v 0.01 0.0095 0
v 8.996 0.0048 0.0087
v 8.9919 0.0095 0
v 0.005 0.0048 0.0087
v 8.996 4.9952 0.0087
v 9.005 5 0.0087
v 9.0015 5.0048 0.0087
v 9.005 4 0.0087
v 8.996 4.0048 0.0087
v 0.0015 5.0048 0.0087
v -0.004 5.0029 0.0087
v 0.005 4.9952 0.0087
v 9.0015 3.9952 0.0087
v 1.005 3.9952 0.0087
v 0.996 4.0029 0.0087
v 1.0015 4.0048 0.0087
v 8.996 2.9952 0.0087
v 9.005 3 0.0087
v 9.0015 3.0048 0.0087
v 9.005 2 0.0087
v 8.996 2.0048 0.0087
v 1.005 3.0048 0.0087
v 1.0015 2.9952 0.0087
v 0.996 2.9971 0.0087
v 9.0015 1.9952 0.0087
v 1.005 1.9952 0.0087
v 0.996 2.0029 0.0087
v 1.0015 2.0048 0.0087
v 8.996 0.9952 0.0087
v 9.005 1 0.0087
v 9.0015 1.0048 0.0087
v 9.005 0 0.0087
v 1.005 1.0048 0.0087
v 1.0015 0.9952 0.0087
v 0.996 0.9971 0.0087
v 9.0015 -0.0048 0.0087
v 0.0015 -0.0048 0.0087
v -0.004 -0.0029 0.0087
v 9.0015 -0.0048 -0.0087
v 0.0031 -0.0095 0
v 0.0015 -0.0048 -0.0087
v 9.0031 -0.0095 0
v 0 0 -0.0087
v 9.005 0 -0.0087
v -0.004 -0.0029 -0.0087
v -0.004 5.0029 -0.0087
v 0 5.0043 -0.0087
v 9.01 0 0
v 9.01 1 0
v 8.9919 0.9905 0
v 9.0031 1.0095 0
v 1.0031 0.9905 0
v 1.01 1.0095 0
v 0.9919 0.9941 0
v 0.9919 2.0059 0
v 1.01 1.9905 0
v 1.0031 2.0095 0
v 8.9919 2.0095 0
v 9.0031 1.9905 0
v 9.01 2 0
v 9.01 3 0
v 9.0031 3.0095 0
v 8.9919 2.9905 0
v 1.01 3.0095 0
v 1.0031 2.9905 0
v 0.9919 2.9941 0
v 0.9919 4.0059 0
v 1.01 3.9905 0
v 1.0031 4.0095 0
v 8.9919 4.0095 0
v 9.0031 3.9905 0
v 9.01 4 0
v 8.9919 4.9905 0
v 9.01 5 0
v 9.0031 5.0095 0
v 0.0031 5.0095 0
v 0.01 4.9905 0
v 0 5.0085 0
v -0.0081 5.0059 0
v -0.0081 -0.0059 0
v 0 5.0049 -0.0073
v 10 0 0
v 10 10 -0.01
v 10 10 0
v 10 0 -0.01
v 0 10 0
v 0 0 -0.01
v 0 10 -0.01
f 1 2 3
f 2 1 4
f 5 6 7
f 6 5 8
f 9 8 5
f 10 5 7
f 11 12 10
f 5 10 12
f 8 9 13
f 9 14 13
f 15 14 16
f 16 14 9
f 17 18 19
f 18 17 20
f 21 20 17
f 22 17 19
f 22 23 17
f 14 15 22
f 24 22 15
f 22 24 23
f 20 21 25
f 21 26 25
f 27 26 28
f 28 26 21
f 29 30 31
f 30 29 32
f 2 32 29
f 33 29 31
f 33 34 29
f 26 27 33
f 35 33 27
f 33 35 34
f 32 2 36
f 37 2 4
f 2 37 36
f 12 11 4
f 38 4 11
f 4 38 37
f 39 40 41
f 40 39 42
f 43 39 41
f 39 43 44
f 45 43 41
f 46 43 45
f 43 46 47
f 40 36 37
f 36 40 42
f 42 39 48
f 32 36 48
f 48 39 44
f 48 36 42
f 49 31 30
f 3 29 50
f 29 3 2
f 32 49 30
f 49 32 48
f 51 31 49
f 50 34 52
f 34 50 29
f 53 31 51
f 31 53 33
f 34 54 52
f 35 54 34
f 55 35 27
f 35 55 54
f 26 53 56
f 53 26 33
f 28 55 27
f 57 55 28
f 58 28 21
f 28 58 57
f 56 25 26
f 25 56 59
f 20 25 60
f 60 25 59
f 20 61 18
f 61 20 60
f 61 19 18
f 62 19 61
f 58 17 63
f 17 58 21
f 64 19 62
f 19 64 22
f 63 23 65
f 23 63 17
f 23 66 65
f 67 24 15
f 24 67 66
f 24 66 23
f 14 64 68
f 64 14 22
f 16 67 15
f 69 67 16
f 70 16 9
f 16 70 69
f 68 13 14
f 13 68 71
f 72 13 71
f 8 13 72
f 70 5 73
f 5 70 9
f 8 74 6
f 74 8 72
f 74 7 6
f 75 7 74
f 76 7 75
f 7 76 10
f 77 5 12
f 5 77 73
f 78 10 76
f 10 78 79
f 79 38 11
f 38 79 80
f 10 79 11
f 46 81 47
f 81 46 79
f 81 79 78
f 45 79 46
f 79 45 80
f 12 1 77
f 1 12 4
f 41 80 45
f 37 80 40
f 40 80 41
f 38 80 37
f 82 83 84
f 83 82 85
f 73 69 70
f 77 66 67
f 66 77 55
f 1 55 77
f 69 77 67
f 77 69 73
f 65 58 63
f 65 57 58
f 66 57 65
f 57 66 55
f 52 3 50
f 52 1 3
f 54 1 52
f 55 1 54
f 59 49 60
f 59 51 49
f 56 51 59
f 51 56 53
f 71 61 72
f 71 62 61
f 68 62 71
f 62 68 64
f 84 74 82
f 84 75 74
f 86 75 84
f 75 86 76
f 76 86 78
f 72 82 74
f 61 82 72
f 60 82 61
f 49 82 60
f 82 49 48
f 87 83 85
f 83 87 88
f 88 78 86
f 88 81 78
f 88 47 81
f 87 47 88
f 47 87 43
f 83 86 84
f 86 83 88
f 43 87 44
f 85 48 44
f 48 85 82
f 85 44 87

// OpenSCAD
hull(){
    translate([1.0, 0.0]) sphere(0.01);
    translate([2.0, 0.0]) sphere(0.01);
}
hull(){
    translate([2.0, 0.0]) sphere(0.01);
    translate([3.0, 0.0]) sphere(0.01);
}
hull(){
    translate([3.0, 0.0]) sphere(0.01);
    translate([4.0, 0.0]) sphere(0.01);
}
hull(){
    translate([4.0, 0.0]) sphere(0.01);
    translate([5.0, 0.0]) sphere(0.01);
}
hull(){
    translate([5.0, 0.0]) sphere(0.01);
    translate([6.0, 0.0]) sphere(0.01);
}
hull(){
    translate([6.0, 0.0]) sphere(0.01);
    translate([7.0, 0.0]) sphere(0.01);
}
hull(){
    translate([7.0, 0.0]) sphere(0.01);
    translate([8.0, 0.0]) sphere(0.01);
}
hull(){
    translate([8.0, 0.0]) sphere(0.01);
    translate([9.0, 0.0]) sphere(0.01);
}
hull(){
    translate([9.0, 0.0]) sphere(0.01);
    translate([9.0, 1.0]) sphere(0.01);
}
hull(){
    translate([9.0, 1.0]) sphere(0.01);
    translate([8.0, 1.0]) sphere(0.01);
}
hull(){
    translate([8.0, 1.0]) sphere(0.01);
    translate([7.0, 1.0]) sphere(0.01);
}
hull(){
    translate([7.0, 1.0]) sphere(0.01);
    translate([6.0, 1.0]) sphere(0.01);
}
hull(){
    translate([6.0, 1.0]) sphere(0.01);
    translate([5.0, 1.0]) sphere(0.01);
}
hull(){
    translate([5.0, 1.0]) sphere(0.01);
    translate([4.0, 1.0]) sphere(0.01);
}
hull(){
    translate([4.0, 1.0]) sphere(0.01);
    translate([3.0, 1.0]) sphere(0.01);
}
hull(){
    translate([3.0, 1.0]) sphere(0.01);
    translate([2.0, 1.0]) sphere(0.01);
}
hull(){
    translate([2.0, 1.0]) sphere(0.01);
    translate([1.0, 1.0]) sphere(0.01);
}
hull(){
    translate([1.0, 1.0]) sphere(0.01);
    translate([1.0, 2.0]) sphere(0.01);
}
hull(){
    translate([1.0, 2.0]) sphere(0.01);
    translate([2.0, 2.0]) sphere(0.01);
}
hull(){
    translate([2.0, 2.0]) sphere(0.01);
    translate([3.0, 2.0]) sphere(0.01);
}
hull(){
    translate([3.0, 2.0]) sphere(0.01);
    translate([4.0, 2.0]) sphere(0.01);
}
hull(){
    translate([4.0, 2.0]) sphere(0.01);
    translate([5.0, 2.0]) sphere(0.01);
}
hull(){
    translate([5.0, 2.0]) sphere(0.01);
    translate([6.0, 2.0]) sphere(0.01);
}
hull(){
    translate([6.0, 2.0]) sphere(0.01);
    translate([7.0, 2.0]) sphere(0.01);
}
hull(){
    translate([7.0, 2.0]) sphere(0.01);
    translate([8.0, 2.0]) sphere(0.01);
}
hull(){
    translate([8.0, 2.0]) sphere(0.01);
    translate([9.0, 2.0]) sphere(0.01);
}
hull(){
    translate([9.0, 2.0]) sphere(0.01);
    translate([9.0, 3.0]) sphere(0.01);
}
hull(){
    translate([9.0, 3.0]) sphere(0.01);
    translate([8.0, 3.0]) sphere(0.01);
}
hull(){
    translate([8.0, 3.0]) sphere(0.01);
    translate([7.0, 3.0]) sphere(0.01);
}
hull(){
    translate([7.0, 3.0]) sphere(0.01);
    translate([6.0, 3.0]) sphere(0.01);
}
hull(){
    translate([6.0, 3.0]) sphere(0.01);
    translate([5.0, 3.0]) sphere(0.01);
}
hull(){
    translate([5.0, 3.0]) sphere(0.01);
    translate([4.0, 3.0]) sphere(0.01);
}
hull(){
    translate([4.0, 3.0]) sphere(0.01);
    translate([3.0, 3.0]) sphere(0.01);
}
hull(){
    translate([3.0, 3.0]) sphere(0.01);
    translate([2.0, 3.0]) sphere(0.01);
}
hull(){
    translate([2.0, 3.0]) sphere(0.01);
    translate([1.0, 3.0]) sphere(0.01);
}
hull(){
    translate([1.0, 3.0]) sphere(0.01);
    translate([1.0, 4.0]) sphere(0.01);
}
hull(){
    translate([1.0, 4.0]) sphere(0.01);
    translate([2.0, 4.0]) sphere(0.01);
}
hull(){
    translate([2.0, 4.0]) sphere(0.01);
    translate([3.0, 4.0]) sphere(0.01);
}
hull(){
    translate([3.0, 4.0]) sphere(0.01);
    translate([4.0, 4.0]) sphere(0.01);
}
hull(){
    translate([4.0, 4.0]) sphere(0.01);
    translate([5.0, 4.0]) sphere(0.01);
}
hull(){
    translate([5.0, 4.0]) sphere(0.01);
    translate([6.0, 4.0]) sphere(0.01);
}
hull(){
    translate([6.0, 4.0]) sphere(0.01);
    translate([7.0, 4.0]) sphere(0.01);
}
hull(){
    translate([7.0, 4.0]) sphere(0.01);
    translate([8.0, 4.0]) sphere(0.01);
}
hull(){
    translate([8.0, 4.0]) sphere(0.01);
    translate([9.0, 4.0]) sphere(0.01);
}
hull(){
    translate([9.0, 4.0]) sphere(0.01);
    translate([9.0, 5.0]) sphere(0.01);
}
hull(){
    translate([9.0, 5.0]) sphere(0.01);
    translate([8.0, 5.0]) sphere(0.01);
}
hull(){
    translate([8.0, 5.0]) sphere(0.01);
    translate([7.0, 5.0]) sphere(0.01);
}
hull(){
    translate([7.0, 5.0]) sphere(0.01);
    translate([6.0, 5.0]) sphere(0.01);
}
hull(){
    translate([6.0, 5.0]) sphere(0.01);
    translate([5.0, 5.0]) sphere(0.01);
}
hull(){
    translate([5.0, 5.0]) sphere(0.01);
    translate([4.0, 5.0]) sphere(0.01);
}
hull(){
    translate([4.0, 5.0]) sphere(0.01);
    translate([3.0, 5.0]) sphere(0.01);
}
hull(){
    translate([3.0, 5.0]) sphere(0.01);
    translate([2.0, 5.0]) sphere(0.01);
}
hull(){
    translate([2.0, 5.0]) sphere(0.01);
    translate([1.0, 5.0]) sphere(0.01);
}
hull(){
    translate([1.0, 5.0]) sphere(0.01);
    translate([0.0, 5.0]) sphere(0.01);
}
hull(){
    translate([0.0, 5.0]) sphere(0.01);
    translate([0.0, 4.0]) sphere(0.01);
}
hull(){
    translate([0.0, 4.0]) sphere(0.01);
    translate([0.0, 3.0]) sphere(0.01);
}
hull(){
    translate([0.0, 3.0]) sphere(0.01);
    translate([0.0, 2.0]) sphere(0.01);
}
hull(){
    translate([0.0, 2.0]) sphere(0.01);
    translate([0.0, 1.0]) sphere(0.01);
}
hull(){
    translate([0.0, 1.0]) sphere(0.01);
    translate([0.0, 0.0]) sphere(0.01);
}
hull(){
    translate([0.0, 0.0]) sphere(0.01);
    translate([1.0, 0.0]) sphere(0.01);
}
translate([0,0,-0.01]) color([0.1,0.1,0.1]) cube([10,10,0.01]);
